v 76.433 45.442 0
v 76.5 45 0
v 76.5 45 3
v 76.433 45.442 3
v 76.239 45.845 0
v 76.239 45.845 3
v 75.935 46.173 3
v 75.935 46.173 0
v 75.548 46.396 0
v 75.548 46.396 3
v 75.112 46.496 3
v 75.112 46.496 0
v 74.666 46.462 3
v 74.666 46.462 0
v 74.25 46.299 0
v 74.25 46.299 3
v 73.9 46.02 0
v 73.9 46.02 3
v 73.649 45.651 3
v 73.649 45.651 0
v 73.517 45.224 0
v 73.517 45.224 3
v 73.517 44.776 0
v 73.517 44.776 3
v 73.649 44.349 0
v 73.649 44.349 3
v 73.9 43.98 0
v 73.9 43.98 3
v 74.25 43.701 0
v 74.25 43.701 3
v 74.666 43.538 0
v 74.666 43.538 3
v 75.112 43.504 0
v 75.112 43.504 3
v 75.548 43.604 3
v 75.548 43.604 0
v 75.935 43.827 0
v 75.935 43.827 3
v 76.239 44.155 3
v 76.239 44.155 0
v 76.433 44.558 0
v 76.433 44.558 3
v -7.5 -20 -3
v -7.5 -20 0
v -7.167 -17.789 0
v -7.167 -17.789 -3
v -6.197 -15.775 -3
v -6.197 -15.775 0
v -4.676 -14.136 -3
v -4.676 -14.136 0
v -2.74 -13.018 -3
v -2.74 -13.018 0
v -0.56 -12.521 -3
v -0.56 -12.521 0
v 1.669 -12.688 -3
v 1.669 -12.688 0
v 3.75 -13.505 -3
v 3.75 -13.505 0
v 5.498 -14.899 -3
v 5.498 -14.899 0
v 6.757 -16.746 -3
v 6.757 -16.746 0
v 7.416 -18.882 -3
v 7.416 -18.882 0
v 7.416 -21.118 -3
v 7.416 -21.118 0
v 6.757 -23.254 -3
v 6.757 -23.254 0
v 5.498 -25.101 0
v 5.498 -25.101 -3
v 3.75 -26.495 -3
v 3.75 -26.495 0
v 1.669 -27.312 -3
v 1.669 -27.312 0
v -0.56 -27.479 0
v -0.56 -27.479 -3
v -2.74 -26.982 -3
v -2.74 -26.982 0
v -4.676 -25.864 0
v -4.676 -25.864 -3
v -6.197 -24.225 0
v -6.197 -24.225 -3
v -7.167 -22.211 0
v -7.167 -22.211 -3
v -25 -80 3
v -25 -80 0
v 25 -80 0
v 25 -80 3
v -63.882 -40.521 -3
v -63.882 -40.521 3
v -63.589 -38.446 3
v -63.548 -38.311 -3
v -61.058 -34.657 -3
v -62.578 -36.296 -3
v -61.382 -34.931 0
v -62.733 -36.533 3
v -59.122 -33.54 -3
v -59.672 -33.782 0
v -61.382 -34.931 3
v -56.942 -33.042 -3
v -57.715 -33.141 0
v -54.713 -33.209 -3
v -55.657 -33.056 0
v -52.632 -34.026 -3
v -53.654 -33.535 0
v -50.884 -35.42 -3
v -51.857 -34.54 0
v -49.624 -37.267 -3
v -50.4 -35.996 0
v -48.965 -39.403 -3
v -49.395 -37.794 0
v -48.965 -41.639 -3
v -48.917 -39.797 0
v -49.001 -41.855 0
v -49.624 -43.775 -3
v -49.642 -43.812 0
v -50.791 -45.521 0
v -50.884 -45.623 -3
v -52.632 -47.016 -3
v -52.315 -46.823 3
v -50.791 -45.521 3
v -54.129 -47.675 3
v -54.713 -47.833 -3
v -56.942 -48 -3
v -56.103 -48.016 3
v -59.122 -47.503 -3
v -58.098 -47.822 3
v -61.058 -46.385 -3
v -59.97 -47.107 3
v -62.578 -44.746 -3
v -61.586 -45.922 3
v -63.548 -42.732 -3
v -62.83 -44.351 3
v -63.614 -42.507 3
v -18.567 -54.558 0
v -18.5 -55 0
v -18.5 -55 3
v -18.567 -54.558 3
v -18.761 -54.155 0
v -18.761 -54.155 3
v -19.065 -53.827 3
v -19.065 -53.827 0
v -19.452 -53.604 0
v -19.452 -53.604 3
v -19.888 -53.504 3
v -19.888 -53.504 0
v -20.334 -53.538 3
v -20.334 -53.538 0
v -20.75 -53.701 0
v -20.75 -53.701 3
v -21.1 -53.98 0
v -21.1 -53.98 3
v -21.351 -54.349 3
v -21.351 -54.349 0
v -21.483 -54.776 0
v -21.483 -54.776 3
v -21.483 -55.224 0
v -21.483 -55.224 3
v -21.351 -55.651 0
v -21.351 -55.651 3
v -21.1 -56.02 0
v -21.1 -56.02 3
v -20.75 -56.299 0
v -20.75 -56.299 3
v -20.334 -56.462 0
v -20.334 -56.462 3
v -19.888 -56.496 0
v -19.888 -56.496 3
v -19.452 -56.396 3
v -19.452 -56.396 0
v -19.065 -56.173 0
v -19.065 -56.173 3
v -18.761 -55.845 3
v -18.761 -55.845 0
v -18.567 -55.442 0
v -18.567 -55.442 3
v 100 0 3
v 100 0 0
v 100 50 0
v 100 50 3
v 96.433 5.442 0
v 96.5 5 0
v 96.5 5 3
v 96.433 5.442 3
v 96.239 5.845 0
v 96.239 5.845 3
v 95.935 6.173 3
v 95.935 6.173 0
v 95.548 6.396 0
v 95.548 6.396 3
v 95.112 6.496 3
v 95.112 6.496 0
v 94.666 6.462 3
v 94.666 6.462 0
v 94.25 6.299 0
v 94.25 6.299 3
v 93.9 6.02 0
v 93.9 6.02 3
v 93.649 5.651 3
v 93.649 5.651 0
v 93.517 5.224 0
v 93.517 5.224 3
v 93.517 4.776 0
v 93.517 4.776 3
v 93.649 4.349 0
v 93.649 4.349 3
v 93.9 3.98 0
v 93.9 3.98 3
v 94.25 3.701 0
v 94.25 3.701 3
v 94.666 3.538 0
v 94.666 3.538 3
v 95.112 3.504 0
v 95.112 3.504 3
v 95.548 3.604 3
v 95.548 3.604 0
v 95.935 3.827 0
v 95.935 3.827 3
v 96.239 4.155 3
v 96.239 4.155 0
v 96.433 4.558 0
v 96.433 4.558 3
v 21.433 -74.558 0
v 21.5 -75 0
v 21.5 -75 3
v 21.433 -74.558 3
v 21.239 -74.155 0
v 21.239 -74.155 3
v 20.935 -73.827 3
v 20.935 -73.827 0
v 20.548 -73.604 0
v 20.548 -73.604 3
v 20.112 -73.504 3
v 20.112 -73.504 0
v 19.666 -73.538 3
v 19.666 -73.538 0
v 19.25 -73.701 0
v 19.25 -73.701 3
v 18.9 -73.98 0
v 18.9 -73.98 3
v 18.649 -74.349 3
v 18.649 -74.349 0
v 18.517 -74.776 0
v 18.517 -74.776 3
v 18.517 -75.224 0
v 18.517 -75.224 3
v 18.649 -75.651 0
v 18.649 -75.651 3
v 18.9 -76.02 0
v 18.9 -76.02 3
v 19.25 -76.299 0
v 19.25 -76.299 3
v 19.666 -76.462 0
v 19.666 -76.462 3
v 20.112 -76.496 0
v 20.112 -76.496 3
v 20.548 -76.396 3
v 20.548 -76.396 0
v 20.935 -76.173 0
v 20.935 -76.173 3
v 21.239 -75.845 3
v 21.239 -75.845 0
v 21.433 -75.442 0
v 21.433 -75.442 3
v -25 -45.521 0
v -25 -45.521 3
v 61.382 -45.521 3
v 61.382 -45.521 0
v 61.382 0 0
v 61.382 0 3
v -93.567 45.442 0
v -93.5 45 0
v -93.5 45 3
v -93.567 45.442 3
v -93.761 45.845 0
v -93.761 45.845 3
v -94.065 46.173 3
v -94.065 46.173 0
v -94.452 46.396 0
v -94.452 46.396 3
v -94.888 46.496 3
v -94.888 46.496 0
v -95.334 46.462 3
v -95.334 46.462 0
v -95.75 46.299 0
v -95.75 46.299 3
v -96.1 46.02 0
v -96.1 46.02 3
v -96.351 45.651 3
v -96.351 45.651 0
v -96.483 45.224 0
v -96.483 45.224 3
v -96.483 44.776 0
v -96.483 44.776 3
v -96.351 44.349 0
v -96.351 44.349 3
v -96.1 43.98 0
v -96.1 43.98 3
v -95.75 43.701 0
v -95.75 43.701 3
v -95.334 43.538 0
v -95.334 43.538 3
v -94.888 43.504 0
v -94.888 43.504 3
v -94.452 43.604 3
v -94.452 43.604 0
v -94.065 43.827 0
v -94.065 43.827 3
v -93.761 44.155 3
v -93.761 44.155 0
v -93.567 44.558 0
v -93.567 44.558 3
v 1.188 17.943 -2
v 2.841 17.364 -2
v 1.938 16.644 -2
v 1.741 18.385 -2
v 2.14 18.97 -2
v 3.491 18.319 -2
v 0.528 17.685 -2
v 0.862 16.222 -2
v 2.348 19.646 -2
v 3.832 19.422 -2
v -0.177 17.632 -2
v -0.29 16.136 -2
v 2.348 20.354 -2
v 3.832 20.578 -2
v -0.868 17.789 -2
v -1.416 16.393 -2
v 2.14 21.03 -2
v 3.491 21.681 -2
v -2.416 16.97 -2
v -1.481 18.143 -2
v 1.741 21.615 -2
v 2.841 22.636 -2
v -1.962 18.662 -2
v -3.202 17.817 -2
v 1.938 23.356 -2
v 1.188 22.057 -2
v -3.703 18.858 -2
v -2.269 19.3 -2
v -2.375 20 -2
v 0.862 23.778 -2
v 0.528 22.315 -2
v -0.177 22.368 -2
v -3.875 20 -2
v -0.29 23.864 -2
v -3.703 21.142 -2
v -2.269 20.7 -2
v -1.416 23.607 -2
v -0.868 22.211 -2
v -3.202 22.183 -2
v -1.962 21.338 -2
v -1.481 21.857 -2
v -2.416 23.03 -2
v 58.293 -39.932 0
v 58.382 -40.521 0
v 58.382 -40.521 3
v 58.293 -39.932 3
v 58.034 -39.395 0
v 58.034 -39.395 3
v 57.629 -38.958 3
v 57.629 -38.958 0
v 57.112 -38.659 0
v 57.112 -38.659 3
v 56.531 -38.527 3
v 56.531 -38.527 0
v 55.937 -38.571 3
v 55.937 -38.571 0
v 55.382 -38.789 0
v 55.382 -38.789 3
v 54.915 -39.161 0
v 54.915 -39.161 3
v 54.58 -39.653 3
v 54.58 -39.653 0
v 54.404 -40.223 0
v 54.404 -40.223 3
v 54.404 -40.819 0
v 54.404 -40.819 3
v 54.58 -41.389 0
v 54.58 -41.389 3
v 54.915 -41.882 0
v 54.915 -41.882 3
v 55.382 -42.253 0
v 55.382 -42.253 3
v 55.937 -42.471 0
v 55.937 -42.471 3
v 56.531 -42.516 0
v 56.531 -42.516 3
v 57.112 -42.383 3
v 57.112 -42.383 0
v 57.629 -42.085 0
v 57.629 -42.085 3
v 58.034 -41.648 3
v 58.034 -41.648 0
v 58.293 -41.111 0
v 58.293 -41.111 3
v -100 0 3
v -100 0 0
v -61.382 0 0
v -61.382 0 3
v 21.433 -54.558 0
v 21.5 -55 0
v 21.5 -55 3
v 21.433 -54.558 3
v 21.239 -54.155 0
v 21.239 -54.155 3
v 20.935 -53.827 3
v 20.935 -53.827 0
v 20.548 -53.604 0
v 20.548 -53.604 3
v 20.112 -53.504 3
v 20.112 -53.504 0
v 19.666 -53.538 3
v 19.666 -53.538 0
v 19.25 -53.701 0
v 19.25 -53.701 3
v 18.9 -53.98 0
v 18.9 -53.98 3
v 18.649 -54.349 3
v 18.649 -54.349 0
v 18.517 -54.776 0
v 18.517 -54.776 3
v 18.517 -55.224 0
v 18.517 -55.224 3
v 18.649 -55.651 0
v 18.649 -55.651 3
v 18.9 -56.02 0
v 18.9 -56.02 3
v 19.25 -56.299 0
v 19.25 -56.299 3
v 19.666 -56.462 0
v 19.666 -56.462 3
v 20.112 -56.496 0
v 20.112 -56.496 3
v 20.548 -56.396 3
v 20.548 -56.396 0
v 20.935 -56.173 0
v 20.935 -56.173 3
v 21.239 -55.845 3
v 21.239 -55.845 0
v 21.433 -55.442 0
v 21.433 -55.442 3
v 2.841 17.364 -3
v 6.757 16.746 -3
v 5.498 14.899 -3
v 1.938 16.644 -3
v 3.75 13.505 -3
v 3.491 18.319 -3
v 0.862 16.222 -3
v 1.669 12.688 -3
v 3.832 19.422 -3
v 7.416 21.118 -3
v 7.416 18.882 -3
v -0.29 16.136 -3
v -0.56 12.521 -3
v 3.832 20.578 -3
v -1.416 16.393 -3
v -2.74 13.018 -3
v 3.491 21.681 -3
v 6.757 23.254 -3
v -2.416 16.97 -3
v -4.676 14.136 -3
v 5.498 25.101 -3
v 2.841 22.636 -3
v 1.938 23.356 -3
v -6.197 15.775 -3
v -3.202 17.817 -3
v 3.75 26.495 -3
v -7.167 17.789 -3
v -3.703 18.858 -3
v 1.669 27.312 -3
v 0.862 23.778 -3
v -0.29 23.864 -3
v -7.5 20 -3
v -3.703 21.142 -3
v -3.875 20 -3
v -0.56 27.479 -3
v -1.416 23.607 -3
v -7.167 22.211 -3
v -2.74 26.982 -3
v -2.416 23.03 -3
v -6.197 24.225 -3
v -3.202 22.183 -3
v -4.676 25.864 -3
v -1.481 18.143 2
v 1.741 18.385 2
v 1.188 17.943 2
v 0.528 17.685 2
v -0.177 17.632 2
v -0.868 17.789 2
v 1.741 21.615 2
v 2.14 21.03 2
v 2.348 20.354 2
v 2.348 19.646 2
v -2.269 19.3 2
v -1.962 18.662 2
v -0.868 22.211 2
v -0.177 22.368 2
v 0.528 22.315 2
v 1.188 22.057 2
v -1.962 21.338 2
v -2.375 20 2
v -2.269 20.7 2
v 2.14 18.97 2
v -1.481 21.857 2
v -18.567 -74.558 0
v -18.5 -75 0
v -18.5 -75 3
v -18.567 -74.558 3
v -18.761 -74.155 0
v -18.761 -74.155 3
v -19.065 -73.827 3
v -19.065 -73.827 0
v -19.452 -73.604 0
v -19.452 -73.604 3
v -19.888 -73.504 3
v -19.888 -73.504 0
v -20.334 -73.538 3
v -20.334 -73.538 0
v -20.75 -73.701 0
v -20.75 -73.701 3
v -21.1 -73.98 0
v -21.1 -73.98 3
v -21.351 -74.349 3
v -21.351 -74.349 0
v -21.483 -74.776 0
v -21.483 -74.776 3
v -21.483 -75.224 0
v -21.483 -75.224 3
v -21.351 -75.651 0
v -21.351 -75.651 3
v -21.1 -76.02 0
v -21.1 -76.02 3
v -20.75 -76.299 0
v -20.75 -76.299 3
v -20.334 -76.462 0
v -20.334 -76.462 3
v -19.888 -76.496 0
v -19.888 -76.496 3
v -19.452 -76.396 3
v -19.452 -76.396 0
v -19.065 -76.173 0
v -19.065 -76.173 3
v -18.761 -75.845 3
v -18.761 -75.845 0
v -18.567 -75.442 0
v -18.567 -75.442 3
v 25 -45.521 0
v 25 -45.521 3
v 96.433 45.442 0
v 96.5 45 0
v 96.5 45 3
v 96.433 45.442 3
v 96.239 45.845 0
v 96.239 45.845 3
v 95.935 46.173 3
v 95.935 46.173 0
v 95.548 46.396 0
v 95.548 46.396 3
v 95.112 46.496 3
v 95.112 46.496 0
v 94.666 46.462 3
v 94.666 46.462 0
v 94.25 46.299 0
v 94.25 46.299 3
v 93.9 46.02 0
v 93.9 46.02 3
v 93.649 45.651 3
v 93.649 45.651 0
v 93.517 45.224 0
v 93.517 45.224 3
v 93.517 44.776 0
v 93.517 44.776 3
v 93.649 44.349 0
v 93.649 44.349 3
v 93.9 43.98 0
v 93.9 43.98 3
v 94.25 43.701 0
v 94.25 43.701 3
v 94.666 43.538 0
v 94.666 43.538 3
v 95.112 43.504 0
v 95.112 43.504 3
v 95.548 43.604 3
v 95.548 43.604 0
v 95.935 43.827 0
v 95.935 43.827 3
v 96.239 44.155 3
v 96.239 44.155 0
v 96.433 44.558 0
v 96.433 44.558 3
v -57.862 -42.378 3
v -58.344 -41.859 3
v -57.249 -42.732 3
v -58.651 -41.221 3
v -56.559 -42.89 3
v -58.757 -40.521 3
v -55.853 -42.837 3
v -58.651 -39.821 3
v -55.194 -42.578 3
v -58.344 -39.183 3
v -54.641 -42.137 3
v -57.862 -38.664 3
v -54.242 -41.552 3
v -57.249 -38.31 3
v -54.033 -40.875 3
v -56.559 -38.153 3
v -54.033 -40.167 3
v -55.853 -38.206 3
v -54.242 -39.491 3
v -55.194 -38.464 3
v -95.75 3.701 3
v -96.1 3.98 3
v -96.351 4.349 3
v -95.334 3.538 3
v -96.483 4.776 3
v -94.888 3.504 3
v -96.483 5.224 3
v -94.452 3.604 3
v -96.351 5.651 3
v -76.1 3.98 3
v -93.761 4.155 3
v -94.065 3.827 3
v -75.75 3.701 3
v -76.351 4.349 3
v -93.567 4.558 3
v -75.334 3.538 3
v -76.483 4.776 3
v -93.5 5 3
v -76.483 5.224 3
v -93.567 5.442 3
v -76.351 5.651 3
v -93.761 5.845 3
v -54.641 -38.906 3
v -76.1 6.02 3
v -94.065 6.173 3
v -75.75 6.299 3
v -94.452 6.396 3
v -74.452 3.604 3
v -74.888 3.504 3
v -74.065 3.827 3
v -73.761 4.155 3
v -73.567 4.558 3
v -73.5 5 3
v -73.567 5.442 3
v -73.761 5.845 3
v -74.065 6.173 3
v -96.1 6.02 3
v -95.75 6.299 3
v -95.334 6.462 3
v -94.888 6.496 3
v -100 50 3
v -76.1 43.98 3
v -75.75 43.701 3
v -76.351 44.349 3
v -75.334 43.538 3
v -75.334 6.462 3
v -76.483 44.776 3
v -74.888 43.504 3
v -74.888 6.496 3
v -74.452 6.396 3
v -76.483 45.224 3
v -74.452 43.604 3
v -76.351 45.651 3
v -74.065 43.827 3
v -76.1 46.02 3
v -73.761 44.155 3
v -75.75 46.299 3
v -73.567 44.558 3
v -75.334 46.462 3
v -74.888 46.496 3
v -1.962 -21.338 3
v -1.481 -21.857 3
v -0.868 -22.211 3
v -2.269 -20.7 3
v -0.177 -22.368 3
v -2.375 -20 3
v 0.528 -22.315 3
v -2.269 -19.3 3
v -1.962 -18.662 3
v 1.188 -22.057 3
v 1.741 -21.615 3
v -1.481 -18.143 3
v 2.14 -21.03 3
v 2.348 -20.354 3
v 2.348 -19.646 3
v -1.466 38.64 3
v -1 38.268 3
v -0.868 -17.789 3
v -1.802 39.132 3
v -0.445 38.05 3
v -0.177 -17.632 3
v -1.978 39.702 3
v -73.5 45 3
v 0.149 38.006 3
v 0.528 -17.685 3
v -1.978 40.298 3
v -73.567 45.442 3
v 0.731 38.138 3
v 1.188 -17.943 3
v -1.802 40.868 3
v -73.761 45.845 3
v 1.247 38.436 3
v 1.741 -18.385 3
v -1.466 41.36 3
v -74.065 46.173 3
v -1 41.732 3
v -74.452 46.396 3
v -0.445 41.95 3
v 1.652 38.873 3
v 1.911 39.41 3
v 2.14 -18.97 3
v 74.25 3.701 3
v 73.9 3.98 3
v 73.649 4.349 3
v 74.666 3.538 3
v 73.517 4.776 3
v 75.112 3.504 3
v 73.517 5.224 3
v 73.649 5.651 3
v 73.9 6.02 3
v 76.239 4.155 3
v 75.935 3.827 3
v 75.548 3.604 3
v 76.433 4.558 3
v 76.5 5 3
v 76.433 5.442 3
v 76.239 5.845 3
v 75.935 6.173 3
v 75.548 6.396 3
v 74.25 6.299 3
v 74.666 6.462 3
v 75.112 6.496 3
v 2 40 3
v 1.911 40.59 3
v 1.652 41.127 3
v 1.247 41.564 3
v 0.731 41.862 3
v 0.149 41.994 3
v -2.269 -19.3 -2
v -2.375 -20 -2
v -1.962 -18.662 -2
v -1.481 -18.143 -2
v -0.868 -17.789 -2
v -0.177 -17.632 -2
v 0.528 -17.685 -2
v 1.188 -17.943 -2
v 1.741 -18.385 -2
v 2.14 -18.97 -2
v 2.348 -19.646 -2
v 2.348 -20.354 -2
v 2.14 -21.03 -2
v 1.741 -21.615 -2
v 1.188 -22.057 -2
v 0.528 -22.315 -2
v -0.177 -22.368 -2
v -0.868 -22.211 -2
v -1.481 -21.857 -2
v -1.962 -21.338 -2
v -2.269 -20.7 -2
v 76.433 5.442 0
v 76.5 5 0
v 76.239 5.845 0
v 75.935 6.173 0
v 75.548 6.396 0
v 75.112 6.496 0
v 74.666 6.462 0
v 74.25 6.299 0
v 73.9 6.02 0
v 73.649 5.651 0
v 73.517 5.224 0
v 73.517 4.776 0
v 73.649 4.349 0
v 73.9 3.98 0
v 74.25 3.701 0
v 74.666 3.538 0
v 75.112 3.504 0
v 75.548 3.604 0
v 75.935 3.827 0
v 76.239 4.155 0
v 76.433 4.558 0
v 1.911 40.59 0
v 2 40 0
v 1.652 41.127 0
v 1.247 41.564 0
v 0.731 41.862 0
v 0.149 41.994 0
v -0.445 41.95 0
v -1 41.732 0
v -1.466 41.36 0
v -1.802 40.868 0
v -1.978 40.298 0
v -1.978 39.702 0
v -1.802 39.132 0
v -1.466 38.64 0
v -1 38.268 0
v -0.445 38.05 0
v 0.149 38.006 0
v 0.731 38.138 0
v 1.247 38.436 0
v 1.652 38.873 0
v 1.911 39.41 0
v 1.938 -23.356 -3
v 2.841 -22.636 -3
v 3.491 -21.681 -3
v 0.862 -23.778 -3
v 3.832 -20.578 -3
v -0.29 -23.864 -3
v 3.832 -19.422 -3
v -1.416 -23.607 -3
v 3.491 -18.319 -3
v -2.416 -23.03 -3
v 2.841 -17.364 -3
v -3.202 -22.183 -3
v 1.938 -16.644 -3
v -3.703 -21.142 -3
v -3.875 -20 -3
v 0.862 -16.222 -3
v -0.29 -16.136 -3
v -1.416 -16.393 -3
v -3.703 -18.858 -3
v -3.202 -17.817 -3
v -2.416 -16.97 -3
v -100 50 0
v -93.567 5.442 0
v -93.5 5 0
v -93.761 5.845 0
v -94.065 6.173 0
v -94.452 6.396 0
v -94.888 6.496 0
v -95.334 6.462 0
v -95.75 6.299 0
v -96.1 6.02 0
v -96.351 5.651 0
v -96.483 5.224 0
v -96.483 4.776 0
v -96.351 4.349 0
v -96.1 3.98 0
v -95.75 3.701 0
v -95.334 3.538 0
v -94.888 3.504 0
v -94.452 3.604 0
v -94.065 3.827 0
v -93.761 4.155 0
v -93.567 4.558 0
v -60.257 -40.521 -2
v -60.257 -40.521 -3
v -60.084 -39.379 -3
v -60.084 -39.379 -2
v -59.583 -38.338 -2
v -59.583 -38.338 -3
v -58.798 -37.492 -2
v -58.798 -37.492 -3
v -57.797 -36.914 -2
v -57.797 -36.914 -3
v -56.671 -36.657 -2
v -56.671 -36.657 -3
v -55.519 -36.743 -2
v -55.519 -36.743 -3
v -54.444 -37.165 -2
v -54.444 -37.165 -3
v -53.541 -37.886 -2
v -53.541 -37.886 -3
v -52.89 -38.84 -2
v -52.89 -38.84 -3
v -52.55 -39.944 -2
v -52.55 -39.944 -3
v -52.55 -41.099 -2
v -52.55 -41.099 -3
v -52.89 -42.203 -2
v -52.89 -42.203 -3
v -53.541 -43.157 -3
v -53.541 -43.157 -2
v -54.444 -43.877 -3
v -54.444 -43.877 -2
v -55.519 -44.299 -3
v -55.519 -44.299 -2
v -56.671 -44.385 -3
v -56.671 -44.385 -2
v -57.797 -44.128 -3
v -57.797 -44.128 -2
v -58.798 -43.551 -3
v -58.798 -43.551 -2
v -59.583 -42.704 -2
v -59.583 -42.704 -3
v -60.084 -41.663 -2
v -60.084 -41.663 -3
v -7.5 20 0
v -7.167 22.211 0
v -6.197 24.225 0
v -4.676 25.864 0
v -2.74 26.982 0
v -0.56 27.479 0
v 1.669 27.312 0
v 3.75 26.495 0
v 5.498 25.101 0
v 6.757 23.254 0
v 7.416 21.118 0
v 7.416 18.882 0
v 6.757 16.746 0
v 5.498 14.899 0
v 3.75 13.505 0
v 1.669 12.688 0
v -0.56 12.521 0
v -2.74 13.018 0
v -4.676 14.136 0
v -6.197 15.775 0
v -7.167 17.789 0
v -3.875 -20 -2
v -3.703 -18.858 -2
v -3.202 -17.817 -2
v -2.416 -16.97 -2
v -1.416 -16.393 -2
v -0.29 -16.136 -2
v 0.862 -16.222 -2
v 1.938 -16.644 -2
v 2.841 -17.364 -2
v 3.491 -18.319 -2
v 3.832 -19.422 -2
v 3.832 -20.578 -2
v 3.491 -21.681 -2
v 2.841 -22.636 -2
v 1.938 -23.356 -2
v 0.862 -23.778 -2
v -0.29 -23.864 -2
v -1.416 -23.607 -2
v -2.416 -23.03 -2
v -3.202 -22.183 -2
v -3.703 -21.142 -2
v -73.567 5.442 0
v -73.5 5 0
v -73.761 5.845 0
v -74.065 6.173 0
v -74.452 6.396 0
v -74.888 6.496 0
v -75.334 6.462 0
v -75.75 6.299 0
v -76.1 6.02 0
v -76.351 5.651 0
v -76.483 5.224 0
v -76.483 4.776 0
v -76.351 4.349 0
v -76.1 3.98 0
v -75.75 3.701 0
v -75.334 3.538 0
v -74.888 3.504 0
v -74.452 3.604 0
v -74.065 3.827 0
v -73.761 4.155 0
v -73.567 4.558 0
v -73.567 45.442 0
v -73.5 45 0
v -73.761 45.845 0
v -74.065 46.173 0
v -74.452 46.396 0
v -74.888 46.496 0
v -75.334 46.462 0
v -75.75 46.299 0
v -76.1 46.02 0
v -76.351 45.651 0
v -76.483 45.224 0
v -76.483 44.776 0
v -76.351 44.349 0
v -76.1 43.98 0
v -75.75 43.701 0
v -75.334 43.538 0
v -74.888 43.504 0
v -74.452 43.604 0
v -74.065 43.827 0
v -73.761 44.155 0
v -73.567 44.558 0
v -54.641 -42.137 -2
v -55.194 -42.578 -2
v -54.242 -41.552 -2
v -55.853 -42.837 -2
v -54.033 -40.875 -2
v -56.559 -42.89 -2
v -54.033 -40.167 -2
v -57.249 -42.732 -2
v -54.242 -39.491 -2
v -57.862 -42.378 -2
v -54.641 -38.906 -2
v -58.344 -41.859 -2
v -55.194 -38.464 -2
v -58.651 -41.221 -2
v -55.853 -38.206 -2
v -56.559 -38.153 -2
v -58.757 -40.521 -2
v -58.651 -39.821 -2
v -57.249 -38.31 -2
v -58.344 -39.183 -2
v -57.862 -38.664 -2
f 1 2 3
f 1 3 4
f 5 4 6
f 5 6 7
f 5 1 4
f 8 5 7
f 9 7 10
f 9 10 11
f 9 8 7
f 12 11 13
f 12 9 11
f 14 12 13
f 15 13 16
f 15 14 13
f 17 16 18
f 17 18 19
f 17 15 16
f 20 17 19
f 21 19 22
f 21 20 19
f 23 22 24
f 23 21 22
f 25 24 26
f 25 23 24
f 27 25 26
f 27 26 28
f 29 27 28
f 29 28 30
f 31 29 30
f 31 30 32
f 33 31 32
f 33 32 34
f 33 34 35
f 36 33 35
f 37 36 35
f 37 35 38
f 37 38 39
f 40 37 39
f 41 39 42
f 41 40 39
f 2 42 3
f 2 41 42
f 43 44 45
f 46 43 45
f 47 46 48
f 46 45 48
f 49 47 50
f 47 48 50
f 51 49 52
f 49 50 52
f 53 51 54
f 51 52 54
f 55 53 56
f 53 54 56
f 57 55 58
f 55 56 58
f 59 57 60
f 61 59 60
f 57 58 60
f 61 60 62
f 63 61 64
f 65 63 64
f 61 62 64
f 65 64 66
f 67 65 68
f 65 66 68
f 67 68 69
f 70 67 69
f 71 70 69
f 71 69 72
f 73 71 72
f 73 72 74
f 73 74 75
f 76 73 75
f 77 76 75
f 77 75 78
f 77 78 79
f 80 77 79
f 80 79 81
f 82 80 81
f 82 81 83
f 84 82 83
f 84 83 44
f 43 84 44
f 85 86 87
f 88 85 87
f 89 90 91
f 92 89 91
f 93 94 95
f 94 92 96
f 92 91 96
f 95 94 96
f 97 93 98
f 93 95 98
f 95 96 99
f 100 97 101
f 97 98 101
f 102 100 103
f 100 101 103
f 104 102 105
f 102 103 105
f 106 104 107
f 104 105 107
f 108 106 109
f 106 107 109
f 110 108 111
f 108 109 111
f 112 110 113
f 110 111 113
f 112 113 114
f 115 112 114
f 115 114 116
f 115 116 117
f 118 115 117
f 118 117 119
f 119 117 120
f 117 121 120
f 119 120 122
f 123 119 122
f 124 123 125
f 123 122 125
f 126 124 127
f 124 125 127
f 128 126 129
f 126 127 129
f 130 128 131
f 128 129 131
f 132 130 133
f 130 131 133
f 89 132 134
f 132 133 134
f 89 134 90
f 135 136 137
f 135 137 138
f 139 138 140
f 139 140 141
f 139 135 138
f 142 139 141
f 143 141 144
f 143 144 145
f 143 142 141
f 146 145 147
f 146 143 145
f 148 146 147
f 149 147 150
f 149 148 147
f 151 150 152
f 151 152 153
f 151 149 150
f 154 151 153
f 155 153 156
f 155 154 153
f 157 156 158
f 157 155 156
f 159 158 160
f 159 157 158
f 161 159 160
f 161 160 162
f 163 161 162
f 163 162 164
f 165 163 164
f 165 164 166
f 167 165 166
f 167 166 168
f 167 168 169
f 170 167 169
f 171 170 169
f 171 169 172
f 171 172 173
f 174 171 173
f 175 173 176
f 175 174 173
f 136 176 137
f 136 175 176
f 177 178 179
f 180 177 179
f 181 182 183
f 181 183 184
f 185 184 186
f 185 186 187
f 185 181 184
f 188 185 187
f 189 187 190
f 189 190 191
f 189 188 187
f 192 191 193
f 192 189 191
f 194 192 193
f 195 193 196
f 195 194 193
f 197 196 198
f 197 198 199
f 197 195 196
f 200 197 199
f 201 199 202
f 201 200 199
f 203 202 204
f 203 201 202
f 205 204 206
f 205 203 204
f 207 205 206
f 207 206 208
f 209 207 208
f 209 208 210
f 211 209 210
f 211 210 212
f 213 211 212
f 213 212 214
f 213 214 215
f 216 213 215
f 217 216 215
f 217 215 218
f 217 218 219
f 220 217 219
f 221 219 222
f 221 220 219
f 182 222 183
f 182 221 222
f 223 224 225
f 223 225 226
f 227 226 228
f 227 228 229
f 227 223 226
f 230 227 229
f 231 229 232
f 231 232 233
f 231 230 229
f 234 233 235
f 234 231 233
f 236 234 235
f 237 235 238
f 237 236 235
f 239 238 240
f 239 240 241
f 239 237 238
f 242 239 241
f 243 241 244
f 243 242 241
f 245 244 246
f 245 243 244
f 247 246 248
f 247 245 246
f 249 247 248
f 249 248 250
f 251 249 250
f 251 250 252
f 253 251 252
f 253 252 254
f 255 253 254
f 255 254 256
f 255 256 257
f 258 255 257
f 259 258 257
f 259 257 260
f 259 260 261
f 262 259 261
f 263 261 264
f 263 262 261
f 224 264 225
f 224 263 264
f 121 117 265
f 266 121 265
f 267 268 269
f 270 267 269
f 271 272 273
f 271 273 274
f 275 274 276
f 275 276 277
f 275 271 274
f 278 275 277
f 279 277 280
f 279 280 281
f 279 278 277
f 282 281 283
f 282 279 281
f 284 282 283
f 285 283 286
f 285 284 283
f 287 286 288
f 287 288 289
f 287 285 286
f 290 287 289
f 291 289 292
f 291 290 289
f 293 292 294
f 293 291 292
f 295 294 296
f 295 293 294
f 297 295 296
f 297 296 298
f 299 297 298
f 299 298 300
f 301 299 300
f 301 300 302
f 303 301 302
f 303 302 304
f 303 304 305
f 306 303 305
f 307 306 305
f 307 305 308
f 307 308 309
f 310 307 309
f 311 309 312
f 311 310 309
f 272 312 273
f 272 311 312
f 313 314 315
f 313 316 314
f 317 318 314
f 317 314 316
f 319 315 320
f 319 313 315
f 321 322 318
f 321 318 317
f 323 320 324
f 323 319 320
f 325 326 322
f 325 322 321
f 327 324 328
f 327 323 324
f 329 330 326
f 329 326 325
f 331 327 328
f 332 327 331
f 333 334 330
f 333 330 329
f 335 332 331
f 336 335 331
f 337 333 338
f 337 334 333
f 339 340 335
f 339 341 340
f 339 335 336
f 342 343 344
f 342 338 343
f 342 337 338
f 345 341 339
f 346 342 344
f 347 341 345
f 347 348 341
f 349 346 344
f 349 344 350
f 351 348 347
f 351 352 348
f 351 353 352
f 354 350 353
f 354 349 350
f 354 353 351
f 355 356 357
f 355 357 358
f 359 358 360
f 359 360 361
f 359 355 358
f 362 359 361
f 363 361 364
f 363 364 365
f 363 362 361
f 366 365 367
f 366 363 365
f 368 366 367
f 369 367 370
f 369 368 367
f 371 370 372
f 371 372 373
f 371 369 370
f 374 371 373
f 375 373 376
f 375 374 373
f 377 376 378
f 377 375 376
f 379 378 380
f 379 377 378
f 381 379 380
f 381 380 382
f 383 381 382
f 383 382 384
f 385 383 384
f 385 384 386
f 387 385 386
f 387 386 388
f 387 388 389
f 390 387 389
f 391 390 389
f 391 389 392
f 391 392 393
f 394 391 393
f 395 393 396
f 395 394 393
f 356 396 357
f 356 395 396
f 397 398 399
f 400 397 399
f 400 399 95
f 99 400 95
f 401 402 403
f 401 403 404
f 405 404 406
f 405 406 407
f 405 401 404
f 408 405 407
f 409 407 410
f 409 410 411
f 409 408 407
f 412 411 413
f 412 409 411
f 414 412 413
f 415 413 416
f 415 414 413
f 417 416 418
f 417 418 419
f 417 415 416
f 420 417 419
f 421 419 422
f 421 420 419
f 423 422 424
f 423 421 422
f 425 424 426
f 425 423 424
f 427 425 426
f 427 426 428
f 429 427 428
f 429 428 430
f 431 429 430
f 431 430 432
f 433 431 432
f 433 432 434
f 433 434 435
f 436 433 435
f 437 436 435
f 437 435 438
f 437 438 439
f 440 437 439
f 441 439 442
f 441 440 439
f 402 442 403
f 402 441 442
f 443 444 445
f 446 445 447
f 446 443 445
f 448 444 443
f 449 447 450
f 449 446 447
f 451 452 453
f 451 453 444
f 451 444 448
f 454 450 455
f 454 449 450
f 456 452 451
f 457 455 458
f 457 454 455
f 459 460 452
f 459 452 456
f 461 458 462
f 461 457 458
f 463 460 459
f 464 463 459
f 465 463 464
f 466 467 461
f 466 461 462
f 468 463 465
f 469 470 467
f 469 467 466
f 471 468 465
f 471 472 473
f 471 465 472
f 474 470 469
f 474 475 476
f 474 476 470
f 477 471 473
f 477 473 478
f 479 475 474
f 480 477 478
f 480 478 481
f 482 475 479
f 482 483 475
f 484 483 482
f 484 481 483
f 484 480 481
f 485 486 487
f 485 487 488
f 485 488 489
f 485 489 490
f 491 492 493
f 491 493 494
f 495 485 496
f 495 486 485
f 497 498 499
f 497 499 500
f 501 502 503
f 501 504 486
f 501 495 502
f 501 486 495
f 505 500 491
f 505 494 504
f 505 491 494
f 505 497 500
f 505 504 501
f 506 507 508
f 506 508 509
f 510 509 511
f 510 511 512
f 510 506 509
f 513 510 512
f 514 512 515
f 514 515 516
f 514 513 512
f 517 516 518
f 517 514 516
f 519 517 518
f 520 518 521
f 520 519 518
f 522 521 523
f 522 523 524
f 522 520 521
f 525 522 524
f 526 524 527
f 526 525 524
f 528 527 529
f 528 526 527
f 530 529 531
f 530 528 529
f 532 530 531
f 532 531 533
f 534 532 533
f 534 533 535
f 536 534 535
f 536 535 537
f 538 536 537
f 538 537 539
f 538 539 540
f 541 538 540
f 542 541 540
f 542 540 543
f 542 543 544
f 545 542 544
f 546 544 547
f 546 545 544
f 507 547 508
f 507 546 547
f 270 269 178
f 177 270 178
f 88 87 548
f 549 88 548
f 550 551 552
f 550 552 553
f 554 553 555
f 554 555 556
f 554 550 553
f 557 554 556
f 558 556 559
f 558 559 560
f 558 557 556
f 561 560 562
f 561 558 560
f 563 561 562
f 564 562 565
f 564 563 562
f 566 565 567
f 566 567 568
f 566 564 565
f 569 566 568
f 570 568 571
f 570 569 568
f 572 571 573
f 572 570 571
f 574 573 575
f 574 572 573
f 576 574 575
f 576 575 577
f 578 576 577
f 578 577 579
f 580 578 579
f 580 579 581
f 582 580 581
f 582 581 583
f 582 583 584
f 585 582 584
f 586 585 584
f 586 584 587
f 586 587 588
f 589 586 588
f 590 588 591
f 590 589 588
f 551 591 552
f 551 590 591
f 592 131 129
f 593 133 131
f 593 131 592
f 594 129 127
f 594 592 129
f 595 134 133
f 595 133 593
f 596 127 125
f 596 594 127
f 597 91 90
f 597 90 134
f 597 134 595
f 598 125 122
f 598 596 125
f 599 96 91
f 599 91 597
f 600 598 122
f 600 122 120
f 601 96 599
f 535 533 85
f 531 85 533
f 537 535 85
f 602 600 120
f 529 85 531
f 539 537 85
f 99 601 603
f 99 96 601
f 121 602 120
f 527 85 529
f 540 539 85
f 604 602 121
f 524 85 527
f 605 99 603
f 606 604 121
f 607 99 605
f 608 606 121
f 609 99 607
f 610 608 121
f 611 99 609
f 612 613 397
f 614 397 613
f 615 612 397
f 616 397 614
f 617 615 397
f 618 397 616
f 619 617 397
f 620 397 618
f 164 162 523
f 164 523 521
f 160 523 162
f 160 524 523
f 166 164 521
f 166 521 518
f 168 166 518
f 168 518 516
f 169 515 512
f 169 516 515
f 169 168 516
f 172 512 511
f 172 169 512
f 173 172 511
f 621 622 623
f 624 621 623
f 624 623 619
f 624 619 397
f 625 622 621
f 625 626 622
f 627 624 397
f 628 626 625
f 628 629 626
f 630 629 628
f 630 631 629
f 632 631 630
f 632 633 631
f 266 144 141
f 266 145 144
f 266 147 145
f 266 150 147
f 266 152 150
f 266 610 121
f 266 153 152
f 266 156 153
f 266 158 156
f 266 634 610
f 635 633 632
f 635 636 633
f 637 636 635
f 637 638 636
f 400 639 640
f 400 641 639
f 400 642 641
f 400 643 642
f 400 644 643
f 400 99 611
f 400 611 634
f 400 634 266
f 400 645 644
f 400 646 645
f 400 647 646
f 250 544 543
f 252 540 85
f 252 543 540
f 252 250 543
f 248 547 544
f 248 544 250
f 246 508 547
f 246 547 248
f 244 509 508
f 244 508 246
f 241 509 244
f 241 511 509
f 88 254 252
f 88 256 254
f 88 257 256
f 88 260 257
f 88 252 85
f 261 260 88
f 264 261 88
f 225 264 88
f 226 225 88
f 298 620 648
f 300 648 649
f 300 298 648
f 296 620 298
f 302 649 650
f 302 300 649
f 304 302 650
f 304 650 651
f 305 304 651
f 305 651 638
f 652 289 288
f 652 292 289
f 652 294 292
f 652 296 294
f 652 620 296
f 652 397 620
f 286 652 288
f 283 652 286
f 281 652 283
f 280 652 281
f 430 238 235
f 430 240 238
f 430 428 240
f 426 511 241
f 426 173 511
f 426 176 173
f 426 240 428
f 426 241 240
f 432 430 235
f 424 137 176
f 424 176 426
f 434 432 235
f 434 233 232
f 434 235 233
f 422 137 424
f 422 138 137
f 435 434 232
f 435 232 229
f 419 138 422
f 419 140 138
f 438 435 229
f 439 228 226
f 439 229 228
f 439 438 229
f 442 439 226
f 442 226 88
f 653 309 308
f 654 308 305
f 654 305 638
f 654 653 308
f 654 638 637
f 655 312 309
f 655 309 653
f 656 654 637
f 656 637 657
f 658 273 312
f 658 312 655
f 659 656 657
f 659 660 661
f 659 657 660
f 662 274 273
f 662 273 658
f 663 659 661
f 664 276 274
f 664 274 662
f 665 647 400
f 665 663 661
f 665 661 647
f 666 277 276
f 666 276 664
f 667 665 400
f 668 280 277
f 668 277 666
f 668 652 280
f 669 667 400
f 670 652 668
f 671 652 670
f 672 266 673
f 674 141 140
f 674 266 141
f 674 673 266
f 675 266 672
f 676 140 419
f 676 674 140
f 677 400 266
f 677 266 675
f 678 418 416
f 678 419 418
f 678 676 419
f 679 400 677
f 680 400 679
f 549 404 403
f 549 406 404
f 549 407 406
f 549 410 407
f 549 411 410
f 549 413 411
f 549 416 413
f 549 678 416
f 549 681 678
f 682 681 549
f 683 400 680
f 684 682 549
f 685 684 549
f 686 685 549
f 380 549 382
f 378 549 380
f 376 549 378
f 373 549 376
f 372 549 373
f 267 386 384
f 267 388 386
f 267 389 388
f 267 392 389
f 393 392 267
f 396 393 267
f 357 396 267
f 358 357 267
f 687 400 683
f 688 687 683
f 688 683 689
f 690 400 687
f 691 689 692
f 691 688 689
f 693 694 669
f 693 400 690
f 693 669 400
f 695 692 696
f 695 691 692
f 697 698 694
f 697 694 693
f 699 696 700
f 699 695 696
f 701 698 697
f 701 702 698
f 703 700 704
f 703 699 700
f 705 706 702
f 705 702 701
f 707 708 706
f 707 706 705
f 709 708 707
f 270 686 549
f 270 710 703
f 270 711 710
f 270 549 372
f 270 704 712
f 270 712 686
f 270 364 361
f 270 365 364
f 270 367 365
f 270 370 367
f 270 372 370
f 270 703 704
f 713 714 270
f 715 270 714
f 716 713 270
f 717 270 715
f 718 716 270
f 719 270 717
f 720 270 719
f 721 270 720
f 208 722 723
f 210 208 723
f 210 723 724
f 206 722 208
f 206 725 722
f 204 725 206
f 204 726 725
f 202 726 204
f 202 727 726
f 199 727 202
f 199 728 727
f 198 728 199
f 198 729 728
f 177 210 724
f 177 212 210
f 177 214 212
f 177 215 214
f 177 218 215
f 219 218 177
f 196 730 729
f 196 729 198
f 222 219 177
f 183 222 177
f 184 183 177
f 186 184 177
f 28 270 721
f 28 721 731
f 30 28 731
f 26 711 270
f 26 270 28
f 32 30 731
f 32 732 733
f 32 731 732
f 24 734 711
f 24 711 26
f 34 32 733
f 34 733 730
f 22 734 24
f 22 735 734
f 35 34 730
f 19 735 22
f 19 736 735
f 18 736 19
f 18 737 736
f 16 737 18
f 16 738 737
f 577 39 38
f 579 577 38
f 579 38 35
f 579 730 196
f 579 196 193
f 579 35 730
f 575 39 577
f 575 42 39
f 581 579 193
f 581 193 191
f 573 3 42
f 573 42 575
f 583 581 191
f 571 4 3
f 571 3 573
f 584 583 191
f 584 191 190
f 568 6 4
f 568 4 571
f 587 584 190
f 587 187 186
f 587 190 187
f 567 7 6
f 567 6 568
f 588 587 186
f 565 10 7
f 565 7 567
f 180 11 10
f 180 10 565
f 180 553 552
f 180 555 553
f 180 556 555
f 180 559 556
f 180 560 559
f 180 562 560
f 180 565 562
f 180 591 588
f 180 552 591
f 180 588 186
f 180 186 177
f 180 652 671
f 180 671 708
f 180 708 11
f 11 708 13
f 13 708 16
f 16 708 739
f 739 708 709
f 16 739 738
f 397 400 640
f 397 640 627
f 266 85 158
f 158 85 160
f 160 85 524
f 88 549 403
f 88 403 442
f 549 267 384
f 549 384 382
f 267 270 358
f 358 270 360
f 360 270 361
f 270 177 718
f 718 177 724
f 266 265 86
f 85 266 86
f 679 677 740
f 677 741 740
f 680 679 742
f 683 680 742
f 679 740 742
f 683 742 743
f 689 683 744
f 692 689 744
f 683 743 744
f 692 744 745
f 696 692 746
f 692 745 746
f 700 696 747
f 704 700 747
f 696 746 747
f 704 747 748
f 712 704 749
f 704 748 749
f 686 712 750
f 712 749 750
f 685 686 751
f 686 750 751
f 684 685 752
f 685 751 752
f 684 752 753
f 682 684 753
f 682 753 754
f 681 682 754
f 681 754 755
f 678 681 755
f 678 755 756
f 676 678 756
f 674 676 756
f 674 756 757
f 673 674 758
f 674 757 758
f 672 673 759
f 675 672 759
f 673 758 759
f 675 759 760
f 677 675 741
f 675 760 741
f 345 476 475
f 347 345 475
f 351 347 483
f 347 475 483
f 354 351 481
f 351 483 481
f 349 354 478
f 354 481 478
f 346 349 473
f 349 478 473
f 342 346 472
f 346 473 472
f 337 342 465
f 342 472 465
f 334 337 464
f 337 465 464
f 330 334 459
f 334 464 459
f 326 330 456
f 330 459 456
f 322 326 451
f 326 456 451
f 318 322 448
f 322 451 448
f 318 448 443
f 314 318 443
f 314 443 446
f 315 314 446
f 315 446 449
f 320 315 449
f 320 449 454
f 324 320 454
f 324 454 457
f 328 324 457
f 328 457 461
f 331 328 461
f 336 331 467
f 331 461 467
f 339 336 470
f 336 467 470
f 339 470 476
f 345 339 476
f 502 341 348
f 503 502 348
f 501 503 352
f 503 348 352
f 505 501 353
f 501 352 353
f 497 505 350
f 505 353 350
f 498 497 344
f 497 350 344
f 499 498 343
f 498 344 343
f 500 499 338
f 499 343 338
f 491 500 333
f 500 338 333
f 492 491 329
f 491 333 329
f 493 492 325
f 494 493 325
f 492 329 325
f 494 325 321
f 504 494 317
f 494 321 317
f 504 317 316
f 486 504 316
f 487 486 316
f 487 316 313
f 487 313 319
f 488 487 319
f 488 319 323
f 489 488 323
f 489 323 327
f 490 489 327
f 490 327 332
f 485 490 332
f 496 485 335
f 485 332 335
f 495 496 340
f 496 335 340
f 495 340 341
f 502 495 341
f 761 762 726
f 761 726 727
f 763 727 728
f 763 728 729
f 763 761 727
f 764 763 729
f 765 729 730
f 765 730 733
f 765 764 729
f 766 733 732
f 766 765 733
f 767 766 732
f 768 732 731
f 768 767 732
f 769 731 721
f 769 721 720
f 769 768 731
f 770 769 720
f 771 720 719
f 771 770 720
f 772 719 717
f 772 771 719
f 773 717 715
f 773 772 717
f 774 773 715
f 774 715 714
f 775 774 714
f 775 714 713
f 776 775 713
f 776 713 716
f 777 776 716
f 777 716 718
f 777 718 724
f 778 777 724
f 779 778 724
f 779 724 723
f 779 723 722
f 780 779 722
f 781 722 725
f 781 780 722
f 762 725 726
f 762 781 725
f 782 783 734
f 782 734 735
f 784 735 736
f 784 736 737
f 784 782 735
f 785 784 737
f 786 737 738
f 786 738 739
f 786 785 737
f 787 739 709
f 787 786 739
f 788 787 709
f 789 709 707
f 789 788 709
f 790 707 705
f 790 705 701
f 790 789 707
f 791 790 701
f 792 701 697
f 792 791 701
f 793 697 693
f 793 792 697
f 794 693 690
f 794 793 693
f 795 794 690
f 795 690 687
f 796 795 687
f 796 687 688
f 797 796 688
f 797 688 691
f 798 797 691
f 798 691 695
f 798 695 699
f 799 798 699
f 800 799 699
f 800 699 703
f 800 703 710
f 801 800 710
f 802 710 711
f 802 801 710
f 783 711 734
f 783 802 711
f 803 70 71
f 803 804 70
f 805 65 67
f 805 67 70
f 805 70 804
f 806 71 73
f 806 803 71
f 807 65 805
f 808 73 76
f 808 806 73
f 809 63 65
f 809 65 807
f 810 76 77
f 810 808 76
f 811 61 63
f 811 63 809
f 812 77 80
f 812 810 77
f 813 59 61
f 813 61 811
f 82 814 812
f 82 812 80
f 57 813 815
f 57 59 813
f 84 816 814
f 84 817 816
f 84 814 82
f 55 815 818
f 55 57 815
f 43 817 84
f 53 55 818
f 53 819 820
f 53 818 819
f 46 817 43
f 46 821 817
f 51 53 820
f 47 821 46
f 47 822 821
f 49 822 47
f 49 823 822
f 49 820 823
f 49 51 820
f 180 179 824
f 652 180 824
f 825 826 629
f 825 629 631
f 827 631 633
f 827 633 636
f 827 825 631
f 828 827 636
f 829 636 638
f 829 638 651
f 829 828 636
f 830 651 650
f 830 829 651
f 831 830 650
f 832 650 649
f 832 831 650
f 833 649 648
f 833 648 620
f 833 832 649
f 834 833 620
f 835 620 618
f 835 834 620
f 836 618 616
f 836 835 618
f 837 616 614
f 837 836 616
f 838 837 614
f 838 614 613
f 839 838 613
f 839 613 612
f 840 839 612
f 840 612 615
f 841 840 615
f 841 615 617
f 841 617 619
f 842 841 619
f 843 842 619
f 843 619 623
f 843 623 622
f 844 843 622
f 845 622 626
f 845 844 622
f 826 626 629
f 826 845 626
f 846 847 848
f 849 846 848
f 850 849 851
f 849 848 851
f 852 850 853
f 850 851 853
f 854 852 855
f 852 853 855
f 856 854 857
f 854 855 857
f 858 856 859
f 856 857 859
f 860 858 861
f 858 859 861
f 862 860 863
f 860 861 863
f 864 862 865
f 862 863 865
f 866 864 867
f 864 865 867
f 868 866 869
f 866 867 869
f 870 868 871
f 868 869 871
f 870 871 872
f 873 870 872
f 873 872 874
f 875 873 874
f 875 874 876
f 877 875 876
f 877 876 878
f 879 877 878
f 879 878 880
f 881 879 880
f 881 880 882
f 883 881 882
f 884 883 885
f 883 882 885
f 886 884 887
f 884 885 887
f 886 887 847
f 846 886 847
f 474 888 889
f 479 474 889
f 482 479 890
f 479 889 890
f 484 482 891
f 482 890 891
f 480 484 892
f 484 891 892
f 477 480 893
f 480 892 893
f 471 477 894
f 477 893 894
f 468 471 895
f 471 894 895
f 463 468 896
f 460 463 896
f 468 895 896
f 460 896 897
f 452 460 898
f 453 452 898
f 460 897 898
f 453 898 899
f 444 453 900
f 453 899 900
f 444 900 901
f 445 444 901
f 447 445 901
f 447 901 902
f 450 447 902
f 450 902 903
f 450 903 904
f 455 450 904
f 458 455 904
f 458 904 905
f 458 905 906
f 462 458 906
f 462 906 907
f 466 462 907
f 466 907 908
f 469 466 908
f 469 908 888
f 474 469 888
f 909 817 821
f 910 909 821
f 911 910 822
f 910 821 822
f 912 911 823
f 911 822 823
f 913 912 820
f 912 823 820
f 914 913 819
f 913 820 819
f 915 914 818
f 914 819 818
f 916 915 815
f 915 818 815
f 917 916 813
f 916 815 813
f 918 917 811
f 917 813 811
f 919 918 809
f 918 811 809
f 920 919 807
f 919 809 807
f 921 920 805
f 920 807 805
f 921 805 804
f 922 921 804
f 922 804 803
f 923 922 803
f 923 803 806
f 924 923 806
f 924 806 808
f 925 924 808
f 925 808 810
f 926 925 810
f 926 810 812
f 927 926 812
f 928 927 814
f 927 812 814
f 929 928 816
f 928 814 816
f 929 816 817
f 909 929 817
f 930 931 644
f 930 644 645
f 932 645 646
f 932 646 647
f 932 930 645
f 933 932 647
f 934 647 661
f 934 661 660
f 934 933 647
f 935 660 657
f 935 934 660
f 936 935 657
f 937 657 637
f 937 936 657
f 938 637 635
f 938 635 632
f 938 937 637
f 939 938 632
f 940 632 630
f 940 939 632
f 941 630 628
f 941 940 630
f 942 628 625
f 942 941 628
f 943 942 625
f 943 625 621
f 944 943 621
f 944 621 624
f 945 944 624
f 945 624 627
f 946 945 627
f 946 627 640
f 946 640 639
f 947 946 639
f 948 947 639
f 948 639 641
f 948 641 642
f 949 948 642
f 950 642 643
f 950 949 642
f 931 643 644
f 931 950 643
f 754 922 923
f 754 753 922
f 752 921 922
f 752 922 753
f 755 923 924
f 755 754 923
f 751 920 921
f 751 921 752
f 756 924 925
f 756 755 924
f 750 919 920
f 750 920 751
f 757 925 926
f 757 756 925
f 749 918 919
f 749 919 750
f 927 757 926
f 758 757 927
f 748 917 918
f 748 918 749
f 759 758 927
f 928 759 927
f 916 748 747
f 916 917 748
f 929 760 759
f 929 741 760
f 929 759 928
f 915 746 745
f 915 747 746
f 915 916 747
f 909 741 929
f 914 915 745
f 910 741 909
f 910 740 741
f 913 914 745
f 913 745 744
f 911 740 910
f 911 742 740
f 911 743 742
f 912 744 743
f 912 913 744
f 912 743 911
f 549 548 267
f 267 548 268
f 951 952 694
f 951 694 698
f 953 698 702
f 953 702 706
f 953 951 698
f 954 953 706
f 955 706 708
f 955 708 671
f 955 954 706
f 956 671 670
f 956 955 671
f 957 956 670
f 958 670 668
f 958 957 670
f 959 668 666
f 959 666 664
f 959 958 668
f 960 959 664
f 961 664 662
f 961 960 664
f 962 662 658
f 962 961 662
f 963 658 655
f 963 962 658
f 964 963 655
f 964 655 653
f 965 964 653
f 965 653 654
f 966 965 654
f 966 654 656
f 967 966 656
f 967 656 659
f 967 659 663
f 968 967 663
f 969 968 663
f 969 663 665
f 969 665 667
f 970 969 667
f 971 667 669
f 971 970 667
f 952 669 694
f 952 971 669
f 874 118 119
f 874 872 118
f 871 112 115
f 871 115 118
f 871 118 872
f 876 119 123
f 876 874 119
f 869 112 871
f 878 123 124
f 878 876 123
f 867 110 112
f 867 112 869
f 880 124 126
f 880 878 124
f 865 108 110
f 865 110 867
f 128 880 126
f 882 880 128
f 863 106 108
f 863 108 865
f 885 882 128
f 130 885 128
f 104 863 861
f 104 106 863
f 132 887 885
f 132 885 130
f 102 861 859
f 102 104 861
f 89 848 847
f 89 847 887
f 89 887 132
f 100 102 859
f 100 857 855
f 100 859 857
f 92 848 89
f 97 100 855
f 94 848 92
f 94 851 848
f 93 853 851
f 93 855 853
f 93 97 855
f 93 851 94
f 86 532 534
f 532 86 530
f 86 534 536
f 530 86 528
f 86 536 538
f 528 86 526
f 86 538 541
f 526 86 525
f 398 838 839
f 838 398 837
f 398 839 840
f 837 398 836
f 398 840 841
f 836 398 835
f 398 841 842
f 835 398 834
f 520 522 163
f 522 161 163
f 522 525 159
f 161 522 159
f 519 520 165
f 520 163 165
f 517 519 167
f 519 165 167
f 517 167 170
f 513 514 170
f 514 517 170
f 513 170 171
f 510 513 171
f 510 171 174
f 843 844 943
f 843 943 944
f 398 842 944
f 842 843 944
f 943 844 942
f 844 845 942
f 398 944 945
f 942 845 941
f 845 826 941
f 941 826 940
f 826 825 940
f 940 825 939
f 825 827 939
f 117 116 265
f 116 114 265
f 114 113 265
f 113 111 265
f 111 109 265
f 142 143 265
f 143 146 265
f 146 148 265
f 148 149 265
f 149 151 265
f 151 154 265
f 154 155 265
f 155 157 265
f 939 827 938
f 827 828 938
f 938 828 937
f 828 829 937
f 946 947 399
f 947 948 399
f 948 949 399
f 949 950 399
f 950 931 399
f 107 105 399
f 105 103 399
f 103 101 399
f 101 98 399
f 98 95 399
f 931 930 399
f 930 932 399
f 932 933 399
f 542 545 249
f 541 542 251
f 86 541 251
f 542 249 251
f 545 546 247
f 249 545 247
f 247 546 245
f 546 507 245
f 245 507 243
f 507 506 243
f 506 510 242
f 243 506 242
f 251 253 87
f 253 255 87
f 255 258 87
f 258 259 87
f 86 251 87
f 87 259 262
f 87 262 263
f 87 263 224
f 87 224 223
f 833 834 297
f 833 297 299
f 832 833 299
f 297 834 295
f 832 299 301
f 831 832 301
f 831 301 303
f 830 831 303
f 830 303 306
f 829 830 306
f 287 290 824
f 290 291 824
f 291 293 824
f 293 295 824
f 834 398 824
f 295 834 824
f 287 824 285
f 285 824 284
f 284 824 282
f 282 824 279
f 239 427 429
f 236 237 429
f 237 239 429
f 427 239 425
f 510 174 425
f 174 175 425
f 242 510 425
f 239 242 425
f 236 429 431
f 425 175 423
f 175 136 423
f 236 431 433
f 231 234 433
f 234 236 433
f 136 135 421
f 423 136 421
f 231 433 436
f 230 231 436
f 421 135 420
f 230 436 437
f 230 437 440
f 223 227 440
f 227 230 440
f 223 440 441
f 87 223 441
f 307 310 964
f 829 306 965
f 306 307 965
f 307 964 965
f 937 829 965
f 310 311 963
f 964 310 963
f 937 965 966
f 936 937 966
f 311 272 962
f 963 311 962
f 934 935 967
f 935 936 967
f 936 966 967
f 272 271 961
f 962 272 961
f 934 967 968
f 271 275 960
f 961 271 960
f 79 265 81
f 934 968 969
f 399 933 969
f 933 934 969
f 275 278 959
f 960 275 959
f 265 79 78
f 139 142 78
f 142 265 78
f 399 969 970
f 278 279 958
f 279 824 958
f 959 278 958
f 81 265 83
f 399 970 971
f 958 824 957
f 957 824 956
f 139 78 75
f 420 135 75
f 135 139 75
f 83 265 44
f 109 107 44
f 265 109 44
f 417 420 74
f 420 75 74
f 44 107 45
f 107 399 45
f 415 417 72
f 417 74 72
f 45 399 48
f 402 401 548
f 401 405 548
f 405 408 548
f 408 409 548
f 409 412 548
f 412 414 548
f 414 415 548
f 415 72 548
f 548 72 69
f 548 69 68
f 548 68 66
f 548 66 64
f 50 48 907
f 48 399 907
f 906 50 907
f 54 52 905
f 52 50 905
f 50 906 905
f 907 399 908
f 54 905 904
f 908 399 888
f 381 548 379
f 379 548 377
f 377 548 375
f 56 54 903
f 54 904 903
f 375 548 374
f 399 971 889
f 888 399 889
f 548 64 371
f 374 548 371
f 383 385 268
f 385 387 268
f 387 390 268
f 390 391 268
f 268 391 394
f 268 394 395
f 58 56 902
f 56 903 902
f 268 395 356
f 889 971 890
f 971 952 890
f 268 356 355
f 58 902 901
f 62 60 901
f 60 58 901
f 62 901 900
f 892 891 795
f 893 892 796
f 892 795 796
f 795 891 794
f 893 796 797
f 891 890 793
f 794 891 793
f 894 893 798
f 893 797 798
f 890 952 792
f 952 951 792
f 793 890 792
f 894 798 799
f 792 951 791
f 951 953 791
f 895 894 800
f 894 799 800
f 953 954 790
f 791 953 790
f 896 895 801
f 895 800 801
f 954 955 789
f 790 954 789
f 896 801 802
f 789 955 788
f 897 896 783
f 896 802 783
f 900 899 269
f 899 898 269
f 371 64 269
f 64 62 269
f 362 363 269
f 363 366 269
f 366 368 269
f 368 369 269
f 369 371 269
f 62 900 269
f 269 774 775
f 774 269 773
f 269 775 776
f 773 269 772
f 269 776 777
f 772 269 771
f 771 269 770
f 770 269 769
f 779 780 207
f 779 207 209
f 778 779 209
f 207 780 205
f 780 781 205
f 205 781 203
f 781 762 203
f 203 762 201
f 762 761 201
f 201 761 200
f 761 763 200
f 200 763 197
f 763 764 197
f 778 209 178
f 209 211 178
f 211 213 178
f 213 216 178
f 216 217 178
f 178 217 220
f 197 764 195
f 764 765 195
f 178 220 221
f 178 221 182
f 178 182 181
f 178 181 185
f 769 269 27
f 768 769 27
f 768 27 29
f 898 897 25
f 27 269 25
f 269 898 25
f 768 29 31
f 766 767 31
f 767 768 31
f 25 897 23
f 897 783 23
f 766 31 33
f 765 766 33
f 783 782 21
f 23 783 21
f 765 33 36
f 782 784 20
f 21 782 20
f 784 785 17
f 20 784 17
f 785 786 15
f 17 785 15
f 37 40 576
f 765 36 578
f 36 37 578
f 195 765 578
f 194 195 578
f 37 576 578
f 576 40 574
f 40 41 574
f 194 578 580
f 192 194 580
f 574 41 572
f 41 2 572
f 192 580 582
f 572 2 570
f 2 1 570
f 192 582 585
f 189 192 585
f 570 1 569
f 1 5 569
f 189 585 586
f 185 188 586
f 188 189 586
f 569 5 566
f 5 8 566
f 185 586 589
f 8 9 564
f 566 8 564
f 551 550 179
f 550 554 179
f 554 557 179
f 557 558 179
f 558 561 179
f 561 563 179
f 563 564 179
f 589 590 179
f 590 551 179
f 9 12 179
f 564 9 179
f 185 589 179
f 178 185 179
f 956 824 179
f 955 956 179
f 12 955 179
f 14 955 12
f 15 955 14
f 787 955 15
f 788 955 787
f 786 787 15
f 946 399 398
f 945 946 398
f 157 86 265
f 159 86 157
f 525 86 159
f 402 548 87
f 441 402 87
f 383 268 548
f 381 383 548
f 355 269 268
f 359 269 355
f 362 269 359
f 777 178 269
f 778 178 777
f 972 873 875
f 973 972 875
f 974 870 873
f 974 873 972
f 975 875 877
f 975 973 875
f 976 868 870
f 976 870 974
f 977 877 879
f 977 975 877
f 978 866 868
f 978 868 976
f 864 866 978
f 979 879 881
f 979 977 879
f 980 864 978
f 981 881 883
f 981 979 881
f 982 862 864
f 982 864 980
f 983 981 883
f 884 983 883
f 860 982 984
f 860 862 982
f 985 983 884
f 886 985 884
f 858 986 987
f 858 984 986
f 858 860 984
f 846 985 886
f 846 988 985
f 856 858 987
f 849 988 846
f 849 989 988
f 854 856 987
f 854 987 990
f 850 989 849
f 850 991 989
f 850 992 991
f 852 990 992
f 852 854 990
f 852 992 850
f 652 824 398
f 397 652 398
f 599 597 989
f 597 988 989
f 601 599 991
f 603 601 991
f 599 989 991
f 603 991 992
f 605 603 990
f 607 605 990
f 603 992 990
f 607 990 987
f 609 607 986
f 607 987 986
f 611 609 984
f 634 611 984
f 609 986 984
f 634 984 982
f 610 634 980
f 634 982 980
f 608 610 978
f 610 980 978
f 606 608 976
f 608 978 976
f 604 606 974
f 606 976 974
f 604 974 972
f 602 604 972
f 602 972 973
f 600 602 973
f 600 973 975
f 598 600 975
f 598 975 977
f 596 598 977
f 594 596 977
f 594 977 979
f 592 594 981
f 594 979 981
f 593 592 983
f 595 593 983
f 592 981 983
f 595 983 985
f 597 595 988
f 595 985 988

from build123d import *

# Parameters (mm, degrees)
ESQUISSE1_R             = 2
ESQUISSE1_R_2           = 1.5
BOSS_EXTRU_1_DEPTH      = 3
BOSS_EXTRU_2_START      = -3
ESQUISSE3_R             = 7.5
BOSS_EXTRU_2_DEPTH      = 6
ESQUISSE4_R             = 3.875
ENL_V_MAT_EXTRU_1_DEPTH = 1
ESQUISSE5_R             = 2.375
ENL_V_MAT_EXTRU_2_DEPTH = 4
ENL_V_MAT_EXTRU_3_REACH = 3
ESQUISSE6_R             = 2.375


with BuildPart() as part:
    # Esquisse1 → Boss.-Extru.1 (new body)
    with BuildSketch(Plane.XY):
        Polygon((0, 50), (-100, 50), (-100, 0), (-61.381557247, 0), (-61.381557247, -45.5212086), (-25, -45.5212086), (-25, -80), (25, -80), (25, -45.5212086), (61.381557247, -45.5212086), (61.381557247, 0), (100, 0), (100, 50), align=None)
        with Locations((0, 20)):
            Circle(ESQUISSE1_R, mode=Mode.SUBTRACT)
        with Locations((0, -20)):
            Circle(ESQUISSE1_R, mode=Mode.SUBTRACT)
        with Locations((0, 40)):
            Circle(ESQUISSE1_R, mode=Mode.SUBTRACT)
        with Locations((-20, -55)):
            Circle(ESQUISSE1_R_2, mode=Mode.SUBTRACT)
        with Locations((20, -55)):
            Circle(ESQUISSE1_R_2, mode=Mode.SUBTRACT)
        with Locations((20, -75)):
            Circle(ESQUISSE1_R_2, mode=Mode.SUBTRACT)
        with Locations((-20, -75)):
            Circle(ESQUISSE1_R_2, mode=Mode.SUBTRACT)
        with Locations((-95, 45)):
            Circle(ESQUISSE1_R_2, mode=Mode.SUBTRACT)
        with Locations((-75, 45)):
            Circle(ESQUISSE1_R_2, mode=Mode.SUBTRACT)
        with Locations((-75, 5)):
            Circle(ESQUISSE1_R_2, mode=Mode.SUBTRACT)
        with Locations((-95, 5)):
            Circle(ESQUISSE1_R_2, mode=Mode.SUBTRACT)
        with Locations((75, 5)):
            Circle(ESQUISSE1_R_2, mode=Mode.SUBTRACT)
        with Locations((95, 5)):
            Circle(ESQUISSE1_R_2, mode=Mode.SUBTRACT)
        with Locations((75, 45)):
            Circle(ESQUISSE1_R_2, mode=Mode.SUBTRACT)
        with Locations((95, 45)):
            Circle(ESQUISSE1_R_2, mode=Mode.SUBTRACT)
        with Locations((56.381557247, -40.5212086)):
            Circle(ESQUISSE1_R, mode=Mode.SUBTRACT)
        with Locations((-56.381557247, -40.5212086)):
            Circle(ESQUISSE1_R, mode=Mode.SUBTRACT)
    extrude(amount=BOSS_EXTRU_1_DEPTH)

    # Esquisse3 → Boss.-Extru.2 (add)
    with BuildSketch(Plane(origin=(0, 0, 0), x_dir=(-1, 0, 0), z_dir=(0, 0, -1)).offset(BOSS_EXTRU_2_START)):
        with Locations((0, 20)):
            Circle(ESQUISSE3_R)
        with Locations((56.381557247, -40.5212086)):
            Circle(ESQUISSE3_R)
        with Locations((0, -20)):
            Circle(ESQUISSE3_R)
    extrude(amount=BOSS_EXTRU_2_DEPTH)

    # Esquisse4 → Enlèv. mat.-Extru.1 (cut)
    with BuildSketch(Plane(origin=(0, 0, -3), x_dir=(-1, 0, 0), z_dir=(0, 0, -1))):
        with Locations((56.381557247, -40.5212086)):
            Circle(ESQUISSE4_R)
        with Locations((0, 20)):
            Circle(ESQUISSE4_R)
        with Locations((0, -20)):
            Circle(ESQUISSE4_R)
    extrude(amount=-ENL_V_MAT_EXTRU_1_DEPTH, mode=Mode.SUBTRACT)

    # Esquisse5 → Enlèv. mat.-Extru.2 (cut)
    with BuildSketch(Plane(origin=(0, 0, -2), x_dir=(-1, 0, 0), z_dir=(0, 0, -1))):
        with Locations((56.381557247, -40.5212086)):
            Circle(ESQUISSE5_R)
        with Locations((0, 20)):
            Circle(ESQUISSE5_R)
        with Locations((0, -20)):
            Circle(ESQUISSE5_R)
    extrude(amount=-ENL_V_MAT_EXTRU_2_DEPTH, mode=Mode.SUBTRACT)

    # Esquisse6 → Enlèv. mat.-Extru.3 (cut, up to next)
    with BuildSketch(Plane(origin=(0, 0, 2), x_dir=(-1, 0, 0), z_dir=(0, 0, -1)), mode=Mode.PRIVATE) as enl_v_mat_extru_3_sk1:
        with Locations((56.381557247, -40.5212086)):
            Circle(ESQUISSE6_R)
    enl_v_mat_extru_3_tool1 = extrude(enl_v_mat_extru_3_sk1.sketch, amount=-ENL_V_MAT_EXTRU_3_REACH, mode=Mode.PRIVATE) & part.part
    add(enl_v_mat_extru_3_tool1.solids().sort_by_distance((-56.381557, -40.521209, 2))[0], mode=Mode.SUBTRACT)
    # Esquisse6 → Enlèv. mat.-Extru.3 (cut, up to next)
    with BuildSketch(Plane(origin=(0, 0, 2), x_dir=(-1, 0, 0), z_dir=(0, 0, -1)), mode=Mode.PRIVATE) as enl_v_mat_extru_3_sk2:
        with Locations((0, -20)):
            Circle(ESQUISSE6_R)
    enl_v_mat_extru_3_tool2 = extrude(enl_v_mat_extru_3_sk2.sketch, amount=-ENL_V_MAT_EXTRU_3_REACH, mode=Mode.PRIVATE) & part.part
    add(enl_v_mat_extru_3_tool2.solids().sort_by_distance((0, -20, 2))[0], mode=Mode.SUBTRACT)


solid = part.part
